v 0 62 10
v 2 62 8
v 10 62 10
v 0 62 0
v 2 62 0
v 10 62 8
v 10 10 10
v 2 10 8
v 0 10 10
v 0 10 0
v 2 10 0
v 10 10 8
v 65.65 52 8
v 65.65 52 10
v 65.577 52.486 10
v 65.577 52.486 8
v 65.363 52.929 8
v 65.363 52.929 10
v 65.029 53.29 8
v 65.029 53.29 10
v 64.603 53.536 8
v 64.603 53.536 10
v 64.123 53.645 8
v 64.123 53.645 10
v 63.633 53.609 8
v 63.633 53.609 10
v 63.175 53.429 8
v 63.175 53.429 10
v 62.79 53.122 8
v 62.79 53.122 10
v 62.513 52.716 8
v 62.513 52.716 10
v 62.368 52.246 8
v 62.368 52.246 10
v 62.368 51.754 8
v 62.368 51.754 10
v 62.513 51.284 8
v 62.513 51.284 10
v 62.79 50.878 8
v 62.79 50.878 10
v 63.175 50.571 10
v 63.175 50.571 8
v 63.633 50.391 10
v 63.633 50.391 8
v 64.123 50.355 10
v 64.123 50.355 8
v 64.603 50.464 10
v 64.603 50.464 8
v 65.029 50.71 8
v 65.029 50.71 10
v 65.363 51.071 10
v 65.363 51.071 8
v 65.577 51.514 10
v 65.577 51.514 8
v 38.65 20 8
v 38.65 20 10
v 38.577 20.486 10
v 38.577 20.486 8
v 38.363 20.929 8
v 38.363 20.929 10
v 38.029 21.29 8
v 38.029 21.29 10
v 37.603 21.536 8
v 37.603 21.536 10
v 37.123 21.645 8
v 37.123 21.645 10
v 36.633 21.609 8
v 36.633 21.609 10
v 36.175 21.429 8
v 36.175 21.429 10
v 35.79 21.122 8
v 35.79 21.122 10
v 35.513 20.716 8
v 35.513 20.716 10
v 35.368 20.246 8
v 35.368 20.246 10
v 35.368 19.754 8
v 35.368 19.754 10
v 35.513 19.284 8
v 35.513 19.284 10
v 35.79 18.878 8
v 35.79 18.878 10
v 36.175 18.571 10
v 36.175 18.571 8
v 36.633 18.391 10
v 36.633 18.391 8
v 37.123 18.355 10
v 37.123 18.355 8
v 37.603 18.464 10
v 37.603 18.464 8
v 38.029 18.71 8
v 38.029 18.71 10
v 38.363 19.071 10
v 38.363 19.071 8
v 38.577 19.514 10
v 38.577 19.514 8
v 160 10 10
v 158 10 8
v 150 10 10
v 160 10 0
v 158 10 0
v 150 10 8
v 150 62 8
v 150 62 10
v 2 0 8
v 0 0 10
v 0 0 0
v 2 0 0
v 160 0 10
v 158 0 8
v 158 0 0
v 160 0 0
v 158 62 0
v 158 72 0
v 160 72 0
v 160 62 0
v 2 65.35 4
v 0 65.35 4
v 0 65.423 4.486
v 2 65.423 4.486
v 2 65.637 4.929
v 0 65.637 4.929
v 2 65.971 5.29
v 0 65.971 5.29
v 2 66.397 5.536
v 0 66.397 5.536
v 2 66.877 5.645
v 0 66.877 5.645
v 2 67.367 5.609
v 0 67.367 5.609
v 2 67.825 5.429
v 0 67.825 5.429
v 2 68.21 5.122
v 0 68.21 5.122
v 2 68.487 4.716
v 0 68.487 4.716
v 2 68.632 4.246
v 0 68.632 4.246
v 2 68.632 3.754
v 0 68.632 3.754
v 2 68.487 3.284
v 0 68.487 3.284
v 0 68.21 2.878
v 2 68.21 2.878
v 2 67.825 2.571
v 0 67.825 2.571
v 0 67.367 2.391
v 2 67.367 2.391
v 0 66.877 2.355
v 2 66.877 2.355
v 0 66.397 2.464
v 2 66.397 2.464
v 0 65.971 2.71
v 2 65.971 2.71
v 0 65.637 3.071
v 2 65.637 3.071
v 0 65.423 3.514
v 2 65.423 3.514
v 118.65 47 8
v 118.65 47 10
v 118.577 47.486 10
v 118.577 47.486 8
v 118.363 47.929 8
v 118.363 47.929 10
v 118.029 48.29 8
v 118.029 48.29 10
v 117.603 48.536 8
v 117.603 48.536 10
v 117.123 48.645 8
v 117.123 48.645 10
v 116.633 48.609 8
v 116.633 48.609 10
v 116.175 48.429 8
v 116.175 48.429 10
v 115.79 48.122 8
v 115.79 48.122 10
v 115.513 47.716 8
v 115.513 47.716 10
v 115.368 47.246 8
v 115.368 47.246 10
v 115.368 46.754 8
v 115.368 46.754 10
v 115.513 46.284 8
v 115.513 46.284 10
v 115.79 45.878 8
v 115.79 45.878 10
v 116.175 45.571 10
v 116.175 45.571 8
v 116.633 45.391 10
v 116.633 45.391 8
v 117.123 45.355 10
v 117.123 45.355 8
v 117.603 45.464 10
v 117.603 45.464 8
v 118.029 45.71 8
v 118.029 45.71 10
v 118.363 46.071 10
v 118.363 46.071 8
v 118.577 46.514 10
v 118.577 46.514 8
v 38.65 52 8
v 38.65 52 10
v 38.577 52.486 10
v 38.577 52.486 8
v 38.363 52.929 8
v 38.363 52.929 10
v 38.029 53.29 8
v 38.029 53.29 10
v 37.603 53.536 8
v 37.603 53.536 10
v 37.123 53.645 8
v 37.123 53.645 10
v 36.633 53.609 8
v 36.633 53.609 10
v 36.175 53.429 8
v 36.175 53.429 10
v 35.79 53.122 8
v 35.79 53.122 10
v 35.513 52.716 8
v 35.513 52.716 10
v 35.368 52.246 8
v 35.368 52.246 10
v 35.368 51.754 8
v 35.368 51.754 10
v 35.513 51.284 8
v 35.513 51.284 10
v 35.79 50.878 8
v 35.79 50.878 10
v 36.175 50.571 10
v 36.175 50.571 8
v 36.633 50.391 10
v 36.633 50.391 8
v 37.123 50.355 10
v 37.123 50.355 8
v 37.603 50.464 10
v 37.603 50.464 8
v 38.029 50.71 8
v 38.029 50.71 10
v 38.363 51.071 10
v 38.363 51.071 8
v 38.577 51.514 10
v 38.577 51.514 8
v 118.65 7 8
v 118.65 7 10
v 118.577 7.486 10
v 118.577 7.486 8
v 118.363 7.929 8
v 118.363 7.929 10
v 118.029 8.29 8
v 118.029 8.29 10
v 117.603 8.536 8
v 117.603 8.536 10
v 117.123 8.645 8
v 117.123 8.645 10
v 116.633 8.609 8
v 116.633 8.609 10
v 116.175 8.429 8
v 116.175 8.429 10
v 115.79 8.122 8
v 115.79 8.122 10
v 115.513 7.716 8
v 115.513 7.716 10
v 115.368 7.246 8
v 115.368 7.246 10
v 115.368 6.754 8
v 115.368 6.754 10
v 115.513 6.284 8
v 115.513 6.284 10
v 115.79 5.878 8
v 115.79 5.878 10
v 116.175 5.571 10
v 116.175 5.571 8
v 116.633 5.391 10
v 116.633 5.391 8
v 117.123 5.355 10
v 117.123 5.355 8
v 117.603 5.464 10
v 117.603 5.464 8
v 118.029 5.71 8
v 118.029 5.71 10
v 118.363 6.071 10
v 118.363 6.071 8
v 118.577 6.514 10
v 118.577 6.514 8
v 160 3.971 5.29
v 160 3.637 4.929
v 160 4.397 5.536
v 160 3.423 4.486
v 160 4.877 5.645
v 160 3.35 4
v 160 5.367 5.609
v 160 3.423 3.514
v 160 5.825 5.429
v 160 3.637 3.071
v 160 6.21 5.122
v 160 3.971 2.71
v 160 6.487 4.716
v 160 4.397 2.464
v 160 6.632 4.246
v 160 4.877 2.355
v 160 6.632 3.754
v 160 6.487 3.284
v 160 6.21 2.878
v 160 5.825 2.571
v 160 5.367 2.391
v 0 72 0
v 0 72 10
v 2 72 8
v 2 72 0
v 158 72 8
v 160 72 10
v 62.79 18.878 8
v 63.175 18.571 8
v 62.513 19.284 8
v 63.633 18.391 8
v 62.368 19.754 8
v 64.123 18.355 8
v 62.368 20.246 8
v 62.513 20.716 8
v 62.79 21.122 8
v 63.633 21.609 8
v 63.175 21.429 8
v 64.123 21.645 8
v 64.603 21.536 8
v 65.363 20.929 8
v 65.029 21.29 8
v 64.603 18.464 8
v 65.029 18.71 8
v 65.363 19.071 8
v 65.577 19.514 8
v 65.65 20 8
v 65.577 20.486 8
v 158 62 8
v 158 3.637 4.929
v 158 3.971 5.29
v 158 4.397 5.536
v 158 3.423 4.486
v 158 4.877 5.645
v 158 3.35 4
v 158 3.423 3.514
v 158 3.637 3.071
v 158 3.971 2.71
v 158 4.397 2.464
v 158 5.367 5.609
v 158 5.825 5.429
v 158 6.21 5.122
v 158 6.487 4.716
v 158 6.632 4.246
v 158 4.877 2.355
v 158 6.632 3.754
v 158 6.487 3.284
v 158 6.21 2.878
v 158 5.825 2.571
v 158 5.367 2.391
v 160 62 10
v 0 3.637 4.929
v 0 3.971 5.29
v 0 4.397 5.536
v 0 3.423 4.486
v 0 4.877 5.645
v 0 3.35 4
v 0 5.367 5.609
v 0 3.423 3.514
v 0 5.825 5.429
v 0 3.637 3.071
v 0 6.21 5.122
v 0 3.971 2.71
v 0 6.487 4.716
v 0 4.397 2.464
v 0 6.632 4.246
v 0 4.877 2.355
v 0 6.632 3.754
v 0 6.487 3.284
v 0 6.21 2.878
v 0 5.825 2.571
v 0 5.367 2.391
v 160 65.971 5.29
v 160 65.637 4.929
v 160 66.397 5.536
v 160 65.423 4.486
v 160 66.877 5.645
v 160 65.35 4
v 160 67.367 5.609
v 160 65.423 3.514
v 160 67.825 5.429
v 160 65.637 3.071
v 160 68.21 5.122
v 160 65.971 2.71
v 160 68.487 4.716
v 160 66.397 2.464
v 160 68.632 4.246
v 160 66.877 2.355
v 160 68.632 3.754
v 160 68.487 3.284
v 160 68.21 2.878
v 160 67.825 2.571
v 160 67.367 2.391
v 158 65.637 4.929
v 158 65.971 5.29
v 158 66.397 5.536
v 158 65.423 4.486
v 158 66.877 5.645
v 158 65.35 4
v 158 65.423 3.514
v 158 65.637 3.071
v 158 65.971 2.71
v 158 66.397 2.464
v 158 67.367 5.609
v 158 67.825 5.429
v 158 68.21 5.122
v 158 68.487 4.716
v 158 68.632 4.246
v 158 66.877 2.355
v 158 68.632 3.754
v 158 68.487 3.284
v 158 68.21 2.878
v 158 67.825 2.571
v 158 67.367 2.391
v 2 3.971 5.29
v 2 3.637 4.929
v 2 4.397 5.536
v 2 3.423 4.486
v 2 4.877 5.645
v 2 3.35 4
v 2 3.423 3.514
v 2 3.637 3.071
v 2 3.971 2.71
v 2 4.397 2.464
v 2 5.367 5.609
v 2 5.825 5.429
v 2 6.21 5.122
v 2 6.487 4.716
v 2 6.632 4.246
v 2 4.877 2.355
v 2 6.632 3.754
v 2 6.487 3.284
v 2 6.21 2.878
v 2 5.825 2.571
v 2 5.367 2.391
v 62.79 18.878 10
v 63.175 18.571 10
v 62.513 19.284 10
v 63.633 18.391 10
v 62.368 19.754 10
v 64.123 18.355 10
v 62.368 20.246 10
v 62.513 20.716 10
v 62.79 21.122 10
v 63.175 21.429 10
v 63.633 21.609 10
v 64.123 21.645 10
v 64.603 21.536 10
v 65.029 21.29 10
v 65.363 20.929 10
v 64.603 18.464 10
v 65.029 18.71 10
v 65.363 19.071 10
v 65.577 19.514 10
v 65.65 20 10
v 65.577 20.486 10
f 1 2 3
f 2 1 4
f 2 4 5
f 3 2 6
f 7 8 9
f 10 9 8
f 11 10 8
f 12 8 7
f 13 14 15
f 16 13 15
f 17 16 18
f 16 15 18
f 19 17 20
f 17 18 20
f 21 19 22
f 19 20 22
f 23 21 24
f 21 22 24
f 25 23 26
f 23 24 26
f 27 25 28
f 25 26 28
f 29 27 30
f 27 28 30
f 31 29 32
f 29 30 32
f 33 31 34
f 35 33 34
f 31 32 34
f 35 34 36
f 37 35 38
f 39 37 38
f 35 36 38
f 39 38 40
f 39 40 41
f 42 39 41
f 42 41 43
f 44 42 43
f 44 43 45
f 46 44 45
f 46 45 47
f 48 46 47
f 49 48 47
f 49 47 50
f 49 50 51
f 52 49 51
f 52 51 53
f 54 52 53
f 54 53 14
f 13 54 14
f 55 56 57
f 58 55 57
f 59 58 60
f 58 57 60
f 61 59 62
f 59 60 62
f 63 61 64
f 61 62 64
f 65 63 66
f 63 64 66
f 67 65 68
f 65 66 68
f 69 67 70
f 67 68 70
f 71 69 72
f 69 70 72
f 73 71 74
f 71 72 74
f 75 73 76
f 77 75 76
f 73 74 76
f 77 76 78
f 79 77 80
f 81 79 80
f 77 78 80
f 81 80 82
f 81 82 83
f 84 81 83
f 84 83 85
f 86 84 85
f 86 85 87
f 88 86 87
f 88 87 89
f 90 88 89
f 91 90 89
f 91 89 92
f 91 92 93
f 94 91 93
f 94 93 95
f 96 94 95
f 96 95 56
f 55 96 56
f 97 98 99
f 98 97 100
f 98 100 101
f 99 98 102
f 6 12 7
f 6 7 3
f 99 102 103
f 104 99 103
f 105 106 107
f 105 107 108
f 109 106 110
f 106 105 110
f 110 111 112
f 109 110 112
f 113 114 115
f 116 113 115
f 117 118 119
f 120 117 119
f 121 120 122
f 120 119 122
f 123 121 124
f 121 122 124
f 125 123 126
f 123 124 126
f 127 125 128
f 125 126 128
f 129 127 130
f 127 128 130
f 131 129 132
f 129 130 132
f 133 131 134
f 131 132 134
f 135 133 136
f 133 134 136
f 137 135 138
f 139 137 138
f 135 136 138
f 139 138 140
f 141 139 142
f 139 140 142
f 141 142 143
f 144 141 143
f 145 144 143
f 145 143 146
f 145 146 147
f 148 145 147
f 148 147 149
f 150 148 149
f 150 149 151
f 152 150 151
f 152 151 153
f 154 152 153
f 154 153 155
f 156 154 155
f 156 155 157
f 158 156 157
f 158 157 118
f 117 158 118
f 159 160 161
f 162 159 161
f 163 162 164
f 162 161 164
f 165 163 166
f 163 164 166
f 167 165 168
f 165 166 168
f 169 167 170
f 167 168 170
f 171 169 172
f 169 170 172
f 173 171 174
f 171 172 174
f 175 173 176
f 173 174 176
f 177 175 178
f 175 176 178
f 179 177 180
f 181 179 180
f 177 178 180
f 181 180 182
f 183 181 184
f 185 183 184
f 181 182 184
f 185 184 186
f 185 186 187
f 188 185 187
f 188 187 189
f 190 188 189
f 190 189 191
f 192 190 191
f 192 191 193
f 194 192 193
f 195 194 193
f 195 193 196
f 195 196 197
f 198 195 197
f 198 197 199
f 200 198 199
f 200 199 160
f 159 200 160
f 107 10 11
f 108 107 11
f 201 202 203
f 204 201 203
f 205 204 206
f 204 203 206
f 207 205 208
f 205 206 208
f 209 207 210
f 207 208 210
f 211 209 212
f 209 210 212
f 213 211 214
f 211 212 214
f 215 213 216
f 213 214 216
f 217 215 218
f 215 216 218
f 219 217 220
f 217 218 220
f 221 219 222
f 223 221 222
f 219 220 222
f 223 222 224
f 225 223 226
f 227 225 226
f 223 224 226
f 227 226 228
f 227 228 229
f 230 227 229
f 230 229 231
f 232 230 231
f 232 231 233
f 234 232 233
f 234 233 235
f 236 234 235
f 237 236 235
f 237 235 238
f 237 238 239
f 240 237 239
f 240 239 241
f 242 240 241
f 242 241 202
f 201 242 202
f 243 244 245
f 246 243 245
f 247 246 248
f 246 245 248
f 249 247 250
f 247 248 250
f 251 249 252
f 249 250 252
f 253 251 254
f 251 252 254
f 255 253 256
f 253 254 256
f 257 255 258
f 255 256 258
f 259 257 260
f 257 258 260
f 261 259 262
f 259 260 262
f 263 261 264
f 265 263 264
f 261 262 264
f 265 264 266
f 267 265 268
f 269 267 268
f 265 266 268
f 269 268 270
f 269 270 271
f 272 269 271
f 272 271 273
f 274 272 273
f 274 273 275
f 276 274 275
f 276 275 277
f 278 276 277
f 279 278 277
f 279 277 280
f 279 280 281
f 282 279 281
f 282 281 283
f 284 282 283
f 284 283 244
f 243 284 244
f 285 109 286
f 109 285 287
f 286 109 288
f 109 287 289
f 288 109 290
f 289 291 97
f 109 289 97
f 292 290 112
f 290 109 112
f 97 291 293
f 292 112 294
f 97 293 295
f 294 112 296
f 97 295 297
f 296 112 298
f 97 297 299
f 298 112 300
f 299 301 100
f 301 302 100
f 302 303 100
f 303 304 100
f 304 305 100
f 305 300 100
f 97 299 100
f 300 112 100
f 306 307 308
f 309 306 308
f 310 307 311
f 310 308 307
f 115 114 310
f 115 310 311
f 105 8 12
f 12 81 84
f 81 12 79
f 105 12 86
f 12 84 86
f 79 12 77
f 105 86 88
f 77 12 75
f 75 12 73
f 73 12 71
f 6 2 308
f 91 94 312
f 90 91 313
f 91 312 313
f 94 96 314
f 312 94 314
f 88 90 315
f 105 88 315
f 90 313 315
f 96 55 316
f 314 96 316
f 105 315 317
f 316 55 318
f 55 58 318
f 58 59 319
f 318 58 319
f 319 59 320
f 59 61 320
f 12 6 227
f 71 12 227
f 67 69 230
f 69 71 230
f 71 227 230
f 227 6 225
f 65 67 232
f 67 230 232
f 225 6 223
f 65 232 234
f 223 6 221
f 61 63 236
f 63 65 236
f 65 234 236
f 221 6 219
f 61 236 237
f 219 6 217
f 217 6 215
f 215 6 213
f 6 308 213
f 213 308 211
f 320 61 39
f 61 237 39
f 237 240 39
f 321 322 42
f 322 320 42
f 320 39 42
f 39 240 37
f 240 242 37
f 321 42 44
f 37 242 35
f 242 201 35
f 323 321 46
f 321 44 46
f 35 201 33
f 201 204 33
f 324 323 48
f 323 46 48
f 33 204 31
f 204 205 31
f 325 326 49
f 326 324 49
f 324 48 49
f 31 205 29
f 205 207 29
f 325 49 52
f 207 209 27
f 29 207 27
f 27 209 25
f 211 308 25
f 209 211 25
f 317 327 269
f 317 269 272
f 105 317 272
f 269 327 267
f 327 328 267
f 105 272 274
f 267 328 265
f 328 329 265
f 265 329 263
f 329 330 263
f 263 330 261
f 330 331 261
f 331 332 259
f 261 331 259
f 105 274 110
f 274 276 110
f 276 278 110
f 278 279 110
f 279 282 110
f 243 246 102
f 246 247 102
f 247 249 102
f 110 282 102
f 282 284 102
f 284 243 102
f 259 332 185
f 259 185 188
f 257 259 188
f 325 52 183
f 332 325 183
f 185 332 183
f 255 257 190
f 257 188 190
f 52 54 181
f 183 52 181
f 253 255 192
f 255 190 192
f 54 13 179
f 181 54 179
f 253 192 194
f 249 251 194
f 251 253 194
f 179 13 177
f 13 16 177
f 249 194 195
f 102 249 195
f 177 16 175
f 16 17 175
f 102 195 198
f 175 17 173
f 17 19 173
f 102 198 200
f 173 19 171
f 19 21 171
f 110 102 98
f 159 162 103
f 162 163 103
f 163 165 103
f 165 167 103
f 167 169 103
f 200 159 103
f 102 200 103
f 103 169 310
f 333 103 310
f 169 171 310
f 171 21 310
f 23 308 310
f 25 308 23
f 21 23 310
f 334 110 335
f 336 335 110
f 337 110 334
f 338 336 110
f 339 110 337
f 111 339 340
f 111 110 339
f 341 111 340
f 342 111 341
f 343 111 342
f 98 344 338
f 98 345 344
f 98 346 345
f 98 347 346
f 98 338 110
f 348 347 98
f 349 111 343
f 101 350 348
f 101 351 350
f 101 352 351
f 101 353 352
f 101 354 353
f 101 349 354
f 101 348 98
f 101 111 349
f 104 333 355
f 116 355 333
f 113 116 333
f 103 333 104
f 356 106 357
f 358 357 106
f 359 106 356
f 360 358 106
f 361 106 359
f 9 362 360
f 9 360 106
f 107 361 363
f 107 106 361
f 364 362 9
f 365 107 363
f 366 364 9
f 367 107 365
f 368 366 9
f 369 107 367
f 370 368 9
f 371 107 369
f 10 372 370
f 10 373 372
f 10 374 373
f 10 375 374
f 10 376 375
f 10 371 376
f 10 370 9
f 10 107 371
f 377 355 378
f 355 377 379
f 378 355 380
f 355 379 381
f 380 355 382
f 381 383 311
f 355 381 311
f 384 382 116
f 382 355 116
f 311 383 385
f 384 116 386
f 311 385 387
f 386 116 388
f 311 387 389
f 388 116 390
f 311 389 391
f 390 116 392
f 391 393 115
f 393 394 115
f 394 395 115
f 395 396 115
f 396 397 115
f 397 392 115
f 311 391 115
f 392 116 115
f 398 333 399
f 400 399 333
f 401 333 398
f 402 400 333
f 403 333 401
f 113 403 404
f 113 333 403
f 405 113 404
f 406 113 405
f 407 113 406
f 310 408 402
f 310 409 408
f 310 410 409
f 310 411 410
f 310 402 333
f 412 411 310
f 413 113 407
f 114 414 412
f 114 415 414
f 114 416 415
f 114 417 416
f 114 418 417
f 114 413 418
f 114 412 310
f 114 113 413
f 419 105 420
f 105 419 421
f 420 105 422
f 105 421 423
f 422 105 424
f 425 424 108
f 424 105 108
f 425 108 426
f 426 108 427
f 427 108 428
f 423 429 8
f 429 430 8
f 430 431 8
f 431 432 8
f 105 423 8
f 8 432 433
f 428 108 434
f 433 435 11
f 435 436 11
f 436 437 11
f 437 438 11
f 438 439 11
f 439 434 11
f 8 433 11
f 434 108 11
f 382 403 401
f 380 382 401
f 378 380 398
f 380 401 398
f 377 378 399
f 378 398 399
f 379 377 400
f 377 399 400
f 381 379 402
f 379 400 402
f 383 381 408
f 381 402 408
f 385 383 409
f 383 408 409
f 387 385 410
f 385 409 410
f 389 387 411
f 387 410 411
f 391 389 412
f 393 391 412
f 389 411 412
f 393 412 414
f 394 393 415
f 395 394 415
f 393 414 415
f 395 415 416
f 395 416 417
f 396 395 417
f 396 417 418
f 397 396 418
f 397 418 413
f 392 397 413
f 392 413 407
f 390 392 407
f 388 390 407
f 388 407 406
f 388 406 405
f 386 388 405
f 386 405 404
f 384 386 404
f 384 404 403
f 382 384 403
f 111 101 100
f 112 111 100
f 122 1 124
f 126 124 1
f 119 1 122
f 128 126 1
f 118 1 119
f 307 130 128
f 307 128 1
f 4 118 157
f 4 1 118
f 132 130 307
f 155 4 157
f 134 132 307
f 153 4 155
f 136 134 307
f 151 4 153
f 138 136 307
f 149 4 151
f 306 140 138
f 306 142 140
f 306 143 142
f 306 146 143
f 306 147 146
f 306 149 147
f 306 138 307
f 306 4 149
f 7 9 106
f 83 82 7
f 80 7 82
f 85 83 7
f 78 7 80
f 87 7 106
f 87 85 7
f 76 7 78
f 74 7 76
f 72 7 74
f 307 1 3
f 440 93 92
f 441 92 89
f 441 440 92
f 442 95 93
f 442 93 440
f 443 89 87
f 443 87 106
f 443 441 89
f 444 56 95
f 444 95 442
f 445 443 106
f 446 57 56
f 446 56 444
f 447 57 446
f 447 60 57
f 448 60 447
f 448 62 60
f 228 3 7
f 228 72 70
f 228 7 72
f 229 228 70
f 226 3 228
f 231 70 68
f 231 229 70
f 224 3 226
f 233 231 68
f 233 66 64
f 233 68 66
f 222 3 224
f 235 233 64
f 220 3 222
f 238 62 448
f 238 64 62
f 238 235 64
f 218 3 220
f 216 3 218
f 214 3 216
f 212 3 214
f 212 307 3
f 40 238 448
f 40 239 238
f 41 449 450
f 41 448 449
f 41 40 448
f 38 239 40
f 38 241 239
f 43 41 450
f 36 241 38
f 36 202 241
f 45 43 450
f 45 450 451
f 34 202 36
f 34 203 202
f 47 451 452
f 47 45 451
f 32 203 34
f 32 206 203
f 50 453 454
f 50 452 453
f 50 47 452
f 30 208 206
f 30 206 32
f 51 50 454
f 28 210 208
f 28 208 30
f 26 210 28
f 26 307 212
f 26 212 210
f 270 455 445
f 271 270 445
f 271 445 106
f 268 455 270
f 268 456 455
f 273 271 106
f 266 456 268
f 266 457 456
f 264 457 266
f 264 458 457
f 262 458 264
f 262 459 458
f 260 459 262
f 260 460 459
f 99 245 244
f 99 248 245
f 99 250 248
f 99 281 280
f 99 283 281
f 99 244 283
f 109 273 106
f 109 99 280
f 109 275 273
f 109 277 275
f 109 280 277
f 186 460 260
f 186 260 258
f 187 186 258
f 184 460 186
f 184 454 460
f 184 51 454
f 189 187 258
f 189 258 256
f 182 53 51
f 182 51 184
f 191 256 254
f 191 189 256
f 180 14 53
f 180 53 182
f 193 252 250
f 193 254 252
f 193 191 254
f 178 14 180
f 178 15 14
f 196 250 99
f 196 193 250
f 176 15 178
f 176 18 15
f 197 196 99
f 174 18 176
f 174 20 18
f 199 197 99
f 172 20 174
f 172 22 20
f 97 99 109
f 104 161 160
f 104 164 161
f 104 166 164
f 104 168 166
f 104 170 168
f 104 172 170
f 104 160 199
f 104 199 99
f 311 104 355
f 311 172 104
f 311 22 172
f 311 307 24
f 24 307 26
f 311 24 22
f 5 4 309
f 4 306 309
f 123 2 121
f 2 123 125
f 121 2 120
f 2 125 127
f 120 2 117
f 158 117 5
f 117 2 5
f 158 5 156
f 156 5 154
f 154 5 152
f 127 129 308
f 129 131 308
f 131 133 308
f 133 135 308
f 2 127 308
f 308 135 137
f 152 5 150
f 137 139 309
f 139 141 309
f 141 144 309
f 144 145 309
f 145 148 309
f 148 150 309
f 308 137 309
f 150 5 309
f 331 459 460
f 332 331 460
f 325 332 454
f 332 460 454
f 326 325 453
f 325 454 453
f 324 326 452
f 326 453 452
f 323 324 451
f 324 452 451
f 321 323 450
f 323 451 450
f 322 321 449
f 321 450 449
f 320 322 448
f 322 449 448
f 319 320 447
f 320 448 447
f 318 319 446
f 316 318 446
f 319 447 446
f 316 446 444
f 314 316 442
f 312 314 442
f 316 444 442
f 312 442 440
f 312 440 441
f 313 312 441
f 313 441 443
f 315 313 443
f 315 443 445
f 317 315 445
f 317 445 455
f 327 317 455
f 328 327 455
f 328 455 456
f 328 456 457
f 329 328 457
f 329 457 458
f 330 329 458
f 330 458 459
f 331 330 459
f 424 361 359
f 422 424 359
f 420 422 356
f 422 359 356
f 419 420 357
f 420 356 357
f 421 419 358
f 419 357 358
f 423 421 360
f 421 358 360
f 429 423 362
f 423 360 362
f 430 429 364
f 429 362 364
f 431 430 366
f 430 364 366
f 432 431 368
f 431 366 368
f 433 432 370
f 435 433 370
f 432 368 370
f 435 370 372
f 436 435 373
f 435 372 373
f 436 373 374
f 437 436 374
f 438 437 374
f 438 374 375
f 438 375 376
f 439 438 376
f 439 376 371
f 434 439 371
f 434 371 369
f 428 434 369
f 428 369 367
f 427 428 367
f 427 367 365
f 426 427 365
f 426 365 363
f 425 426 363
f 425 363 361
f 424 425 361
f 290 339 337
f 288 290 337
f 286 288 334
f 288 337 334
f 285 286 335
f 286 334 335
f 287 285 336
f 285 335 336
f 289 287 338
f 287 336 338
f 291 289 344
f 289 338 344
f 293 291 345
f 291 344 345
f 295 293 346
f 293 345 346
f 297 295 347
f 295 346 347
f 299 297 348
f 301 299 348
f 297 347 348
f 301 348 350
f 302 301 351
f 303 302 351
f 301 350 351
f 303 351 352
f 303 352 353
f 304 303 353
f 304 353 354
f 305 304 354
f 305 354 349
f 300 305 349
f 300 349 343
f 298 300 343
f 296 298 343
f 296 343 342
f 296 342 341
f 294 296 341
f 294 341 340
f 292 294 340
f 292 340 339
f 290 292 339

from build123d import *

# Parameters (mm, degrees)
BOX002_W      = 156
BOX002_H      = 72
BOX002_DEPTH  = 8
BOX001_W      = 10
BOX001_H      = 52
BOX001_DEPTH  = 10
BOX_W         = 160
BOX_H         = 72
BOX_DEPTH     = 10
SKETCH_R      = 1.65
HOLE_DEPTH    = 160.001
SKETCH001_R   = 1.65
HOLE001_DEPTH = 10.001


with BuildPart() as w_rfel002:
    # Box002 → Box002 (new body)
    with BuildSketch(Plane(origin=(2, 0, 0), x_dir=(1, 0, 0), z_dir=(0, 0, 1))):
        with Locations((78, 36)):
            Rectangle(BOX002_W, BOX002_H)
    extrude(amount=BOX002_DEPTH)


with BuildPart() as w_rfel001:
    # Box001 → Box001 (new body)
    with BuildSketch(Plane(origin=(0, 10, 0), x_dir=(1, 0, 0), z_dir=(0, 0, 1))):
        with Locations((5, 26)):
            Rectangle(BOX001_W, BOX001_H)
    extrude(amount=BOX001_DEPTH)


with BuildPart() as part_mirroring:
    # Part__Mirroring: instance of Würfel001
    add(w_rfel001.part.mirror(Plane(origin=(80, 0, 0), x_dir=(0, -1, 0), z_dir=(1, 0, 0))))


with BuildPart() as body:
    # Box → Box (new body)
    with BuildSketch(Plane.XY):
        with Locations((80, 36)):
            Rectangle(BOX_W, BOX_H)
    extrude(amount=BOX_DEPTH)

    # Cut: cut Würfel001
    add(w_rfel001.part, mode=Mode.SUBTRACT)

    # Cut001: cut Part__Mirroring
    add(part_mirroring.part, mode=Mode.SUBTRACT)

    # Cut002: cut Würfel002
    add(w_rfel002.part, mode=Mode.SUBTRACT)

    # Sketch (on Face1 of BaseFeature) → Hole (cut, through all)
    with BuildSketch(Plane(origin=(0, 0, 0), x_dir=(0, -1, 0), z_dir=(-1, 0, 0))):
        with Locations((-5, 4)):
            Circle(SKETCH_R)
        with Locations((-67, 4)):
            Circle(SKETCH_R)
    extrude(amount=-HOLE_DEPTH, mode=Mode.SUBTRACT)

    # Sketch001 (on Face2 of Hole) → Hole001 (cut, through all)
    with BuildSketch(Plane.XY.offset(10)):
        with Locations((37, 20)):
            Circle(SKETCH001_R)
        with Locations((37, 52)):
            Circle(SKETCH001_R)
        with Locations((64, 52)):
            Circle(SKETCH001_R)
        with Locations((64, 20)):
            Circle(SKETCH001_R)
        with Locations((117, 47)):
            Circle(SKETCH001_R)
        with Locations((117, 7)):
            Circle(SKETCH001_R)
    extrude(amount=-HOLE001_DEPTH, mode=Mode.SUBTRACT)


solid = body.part
